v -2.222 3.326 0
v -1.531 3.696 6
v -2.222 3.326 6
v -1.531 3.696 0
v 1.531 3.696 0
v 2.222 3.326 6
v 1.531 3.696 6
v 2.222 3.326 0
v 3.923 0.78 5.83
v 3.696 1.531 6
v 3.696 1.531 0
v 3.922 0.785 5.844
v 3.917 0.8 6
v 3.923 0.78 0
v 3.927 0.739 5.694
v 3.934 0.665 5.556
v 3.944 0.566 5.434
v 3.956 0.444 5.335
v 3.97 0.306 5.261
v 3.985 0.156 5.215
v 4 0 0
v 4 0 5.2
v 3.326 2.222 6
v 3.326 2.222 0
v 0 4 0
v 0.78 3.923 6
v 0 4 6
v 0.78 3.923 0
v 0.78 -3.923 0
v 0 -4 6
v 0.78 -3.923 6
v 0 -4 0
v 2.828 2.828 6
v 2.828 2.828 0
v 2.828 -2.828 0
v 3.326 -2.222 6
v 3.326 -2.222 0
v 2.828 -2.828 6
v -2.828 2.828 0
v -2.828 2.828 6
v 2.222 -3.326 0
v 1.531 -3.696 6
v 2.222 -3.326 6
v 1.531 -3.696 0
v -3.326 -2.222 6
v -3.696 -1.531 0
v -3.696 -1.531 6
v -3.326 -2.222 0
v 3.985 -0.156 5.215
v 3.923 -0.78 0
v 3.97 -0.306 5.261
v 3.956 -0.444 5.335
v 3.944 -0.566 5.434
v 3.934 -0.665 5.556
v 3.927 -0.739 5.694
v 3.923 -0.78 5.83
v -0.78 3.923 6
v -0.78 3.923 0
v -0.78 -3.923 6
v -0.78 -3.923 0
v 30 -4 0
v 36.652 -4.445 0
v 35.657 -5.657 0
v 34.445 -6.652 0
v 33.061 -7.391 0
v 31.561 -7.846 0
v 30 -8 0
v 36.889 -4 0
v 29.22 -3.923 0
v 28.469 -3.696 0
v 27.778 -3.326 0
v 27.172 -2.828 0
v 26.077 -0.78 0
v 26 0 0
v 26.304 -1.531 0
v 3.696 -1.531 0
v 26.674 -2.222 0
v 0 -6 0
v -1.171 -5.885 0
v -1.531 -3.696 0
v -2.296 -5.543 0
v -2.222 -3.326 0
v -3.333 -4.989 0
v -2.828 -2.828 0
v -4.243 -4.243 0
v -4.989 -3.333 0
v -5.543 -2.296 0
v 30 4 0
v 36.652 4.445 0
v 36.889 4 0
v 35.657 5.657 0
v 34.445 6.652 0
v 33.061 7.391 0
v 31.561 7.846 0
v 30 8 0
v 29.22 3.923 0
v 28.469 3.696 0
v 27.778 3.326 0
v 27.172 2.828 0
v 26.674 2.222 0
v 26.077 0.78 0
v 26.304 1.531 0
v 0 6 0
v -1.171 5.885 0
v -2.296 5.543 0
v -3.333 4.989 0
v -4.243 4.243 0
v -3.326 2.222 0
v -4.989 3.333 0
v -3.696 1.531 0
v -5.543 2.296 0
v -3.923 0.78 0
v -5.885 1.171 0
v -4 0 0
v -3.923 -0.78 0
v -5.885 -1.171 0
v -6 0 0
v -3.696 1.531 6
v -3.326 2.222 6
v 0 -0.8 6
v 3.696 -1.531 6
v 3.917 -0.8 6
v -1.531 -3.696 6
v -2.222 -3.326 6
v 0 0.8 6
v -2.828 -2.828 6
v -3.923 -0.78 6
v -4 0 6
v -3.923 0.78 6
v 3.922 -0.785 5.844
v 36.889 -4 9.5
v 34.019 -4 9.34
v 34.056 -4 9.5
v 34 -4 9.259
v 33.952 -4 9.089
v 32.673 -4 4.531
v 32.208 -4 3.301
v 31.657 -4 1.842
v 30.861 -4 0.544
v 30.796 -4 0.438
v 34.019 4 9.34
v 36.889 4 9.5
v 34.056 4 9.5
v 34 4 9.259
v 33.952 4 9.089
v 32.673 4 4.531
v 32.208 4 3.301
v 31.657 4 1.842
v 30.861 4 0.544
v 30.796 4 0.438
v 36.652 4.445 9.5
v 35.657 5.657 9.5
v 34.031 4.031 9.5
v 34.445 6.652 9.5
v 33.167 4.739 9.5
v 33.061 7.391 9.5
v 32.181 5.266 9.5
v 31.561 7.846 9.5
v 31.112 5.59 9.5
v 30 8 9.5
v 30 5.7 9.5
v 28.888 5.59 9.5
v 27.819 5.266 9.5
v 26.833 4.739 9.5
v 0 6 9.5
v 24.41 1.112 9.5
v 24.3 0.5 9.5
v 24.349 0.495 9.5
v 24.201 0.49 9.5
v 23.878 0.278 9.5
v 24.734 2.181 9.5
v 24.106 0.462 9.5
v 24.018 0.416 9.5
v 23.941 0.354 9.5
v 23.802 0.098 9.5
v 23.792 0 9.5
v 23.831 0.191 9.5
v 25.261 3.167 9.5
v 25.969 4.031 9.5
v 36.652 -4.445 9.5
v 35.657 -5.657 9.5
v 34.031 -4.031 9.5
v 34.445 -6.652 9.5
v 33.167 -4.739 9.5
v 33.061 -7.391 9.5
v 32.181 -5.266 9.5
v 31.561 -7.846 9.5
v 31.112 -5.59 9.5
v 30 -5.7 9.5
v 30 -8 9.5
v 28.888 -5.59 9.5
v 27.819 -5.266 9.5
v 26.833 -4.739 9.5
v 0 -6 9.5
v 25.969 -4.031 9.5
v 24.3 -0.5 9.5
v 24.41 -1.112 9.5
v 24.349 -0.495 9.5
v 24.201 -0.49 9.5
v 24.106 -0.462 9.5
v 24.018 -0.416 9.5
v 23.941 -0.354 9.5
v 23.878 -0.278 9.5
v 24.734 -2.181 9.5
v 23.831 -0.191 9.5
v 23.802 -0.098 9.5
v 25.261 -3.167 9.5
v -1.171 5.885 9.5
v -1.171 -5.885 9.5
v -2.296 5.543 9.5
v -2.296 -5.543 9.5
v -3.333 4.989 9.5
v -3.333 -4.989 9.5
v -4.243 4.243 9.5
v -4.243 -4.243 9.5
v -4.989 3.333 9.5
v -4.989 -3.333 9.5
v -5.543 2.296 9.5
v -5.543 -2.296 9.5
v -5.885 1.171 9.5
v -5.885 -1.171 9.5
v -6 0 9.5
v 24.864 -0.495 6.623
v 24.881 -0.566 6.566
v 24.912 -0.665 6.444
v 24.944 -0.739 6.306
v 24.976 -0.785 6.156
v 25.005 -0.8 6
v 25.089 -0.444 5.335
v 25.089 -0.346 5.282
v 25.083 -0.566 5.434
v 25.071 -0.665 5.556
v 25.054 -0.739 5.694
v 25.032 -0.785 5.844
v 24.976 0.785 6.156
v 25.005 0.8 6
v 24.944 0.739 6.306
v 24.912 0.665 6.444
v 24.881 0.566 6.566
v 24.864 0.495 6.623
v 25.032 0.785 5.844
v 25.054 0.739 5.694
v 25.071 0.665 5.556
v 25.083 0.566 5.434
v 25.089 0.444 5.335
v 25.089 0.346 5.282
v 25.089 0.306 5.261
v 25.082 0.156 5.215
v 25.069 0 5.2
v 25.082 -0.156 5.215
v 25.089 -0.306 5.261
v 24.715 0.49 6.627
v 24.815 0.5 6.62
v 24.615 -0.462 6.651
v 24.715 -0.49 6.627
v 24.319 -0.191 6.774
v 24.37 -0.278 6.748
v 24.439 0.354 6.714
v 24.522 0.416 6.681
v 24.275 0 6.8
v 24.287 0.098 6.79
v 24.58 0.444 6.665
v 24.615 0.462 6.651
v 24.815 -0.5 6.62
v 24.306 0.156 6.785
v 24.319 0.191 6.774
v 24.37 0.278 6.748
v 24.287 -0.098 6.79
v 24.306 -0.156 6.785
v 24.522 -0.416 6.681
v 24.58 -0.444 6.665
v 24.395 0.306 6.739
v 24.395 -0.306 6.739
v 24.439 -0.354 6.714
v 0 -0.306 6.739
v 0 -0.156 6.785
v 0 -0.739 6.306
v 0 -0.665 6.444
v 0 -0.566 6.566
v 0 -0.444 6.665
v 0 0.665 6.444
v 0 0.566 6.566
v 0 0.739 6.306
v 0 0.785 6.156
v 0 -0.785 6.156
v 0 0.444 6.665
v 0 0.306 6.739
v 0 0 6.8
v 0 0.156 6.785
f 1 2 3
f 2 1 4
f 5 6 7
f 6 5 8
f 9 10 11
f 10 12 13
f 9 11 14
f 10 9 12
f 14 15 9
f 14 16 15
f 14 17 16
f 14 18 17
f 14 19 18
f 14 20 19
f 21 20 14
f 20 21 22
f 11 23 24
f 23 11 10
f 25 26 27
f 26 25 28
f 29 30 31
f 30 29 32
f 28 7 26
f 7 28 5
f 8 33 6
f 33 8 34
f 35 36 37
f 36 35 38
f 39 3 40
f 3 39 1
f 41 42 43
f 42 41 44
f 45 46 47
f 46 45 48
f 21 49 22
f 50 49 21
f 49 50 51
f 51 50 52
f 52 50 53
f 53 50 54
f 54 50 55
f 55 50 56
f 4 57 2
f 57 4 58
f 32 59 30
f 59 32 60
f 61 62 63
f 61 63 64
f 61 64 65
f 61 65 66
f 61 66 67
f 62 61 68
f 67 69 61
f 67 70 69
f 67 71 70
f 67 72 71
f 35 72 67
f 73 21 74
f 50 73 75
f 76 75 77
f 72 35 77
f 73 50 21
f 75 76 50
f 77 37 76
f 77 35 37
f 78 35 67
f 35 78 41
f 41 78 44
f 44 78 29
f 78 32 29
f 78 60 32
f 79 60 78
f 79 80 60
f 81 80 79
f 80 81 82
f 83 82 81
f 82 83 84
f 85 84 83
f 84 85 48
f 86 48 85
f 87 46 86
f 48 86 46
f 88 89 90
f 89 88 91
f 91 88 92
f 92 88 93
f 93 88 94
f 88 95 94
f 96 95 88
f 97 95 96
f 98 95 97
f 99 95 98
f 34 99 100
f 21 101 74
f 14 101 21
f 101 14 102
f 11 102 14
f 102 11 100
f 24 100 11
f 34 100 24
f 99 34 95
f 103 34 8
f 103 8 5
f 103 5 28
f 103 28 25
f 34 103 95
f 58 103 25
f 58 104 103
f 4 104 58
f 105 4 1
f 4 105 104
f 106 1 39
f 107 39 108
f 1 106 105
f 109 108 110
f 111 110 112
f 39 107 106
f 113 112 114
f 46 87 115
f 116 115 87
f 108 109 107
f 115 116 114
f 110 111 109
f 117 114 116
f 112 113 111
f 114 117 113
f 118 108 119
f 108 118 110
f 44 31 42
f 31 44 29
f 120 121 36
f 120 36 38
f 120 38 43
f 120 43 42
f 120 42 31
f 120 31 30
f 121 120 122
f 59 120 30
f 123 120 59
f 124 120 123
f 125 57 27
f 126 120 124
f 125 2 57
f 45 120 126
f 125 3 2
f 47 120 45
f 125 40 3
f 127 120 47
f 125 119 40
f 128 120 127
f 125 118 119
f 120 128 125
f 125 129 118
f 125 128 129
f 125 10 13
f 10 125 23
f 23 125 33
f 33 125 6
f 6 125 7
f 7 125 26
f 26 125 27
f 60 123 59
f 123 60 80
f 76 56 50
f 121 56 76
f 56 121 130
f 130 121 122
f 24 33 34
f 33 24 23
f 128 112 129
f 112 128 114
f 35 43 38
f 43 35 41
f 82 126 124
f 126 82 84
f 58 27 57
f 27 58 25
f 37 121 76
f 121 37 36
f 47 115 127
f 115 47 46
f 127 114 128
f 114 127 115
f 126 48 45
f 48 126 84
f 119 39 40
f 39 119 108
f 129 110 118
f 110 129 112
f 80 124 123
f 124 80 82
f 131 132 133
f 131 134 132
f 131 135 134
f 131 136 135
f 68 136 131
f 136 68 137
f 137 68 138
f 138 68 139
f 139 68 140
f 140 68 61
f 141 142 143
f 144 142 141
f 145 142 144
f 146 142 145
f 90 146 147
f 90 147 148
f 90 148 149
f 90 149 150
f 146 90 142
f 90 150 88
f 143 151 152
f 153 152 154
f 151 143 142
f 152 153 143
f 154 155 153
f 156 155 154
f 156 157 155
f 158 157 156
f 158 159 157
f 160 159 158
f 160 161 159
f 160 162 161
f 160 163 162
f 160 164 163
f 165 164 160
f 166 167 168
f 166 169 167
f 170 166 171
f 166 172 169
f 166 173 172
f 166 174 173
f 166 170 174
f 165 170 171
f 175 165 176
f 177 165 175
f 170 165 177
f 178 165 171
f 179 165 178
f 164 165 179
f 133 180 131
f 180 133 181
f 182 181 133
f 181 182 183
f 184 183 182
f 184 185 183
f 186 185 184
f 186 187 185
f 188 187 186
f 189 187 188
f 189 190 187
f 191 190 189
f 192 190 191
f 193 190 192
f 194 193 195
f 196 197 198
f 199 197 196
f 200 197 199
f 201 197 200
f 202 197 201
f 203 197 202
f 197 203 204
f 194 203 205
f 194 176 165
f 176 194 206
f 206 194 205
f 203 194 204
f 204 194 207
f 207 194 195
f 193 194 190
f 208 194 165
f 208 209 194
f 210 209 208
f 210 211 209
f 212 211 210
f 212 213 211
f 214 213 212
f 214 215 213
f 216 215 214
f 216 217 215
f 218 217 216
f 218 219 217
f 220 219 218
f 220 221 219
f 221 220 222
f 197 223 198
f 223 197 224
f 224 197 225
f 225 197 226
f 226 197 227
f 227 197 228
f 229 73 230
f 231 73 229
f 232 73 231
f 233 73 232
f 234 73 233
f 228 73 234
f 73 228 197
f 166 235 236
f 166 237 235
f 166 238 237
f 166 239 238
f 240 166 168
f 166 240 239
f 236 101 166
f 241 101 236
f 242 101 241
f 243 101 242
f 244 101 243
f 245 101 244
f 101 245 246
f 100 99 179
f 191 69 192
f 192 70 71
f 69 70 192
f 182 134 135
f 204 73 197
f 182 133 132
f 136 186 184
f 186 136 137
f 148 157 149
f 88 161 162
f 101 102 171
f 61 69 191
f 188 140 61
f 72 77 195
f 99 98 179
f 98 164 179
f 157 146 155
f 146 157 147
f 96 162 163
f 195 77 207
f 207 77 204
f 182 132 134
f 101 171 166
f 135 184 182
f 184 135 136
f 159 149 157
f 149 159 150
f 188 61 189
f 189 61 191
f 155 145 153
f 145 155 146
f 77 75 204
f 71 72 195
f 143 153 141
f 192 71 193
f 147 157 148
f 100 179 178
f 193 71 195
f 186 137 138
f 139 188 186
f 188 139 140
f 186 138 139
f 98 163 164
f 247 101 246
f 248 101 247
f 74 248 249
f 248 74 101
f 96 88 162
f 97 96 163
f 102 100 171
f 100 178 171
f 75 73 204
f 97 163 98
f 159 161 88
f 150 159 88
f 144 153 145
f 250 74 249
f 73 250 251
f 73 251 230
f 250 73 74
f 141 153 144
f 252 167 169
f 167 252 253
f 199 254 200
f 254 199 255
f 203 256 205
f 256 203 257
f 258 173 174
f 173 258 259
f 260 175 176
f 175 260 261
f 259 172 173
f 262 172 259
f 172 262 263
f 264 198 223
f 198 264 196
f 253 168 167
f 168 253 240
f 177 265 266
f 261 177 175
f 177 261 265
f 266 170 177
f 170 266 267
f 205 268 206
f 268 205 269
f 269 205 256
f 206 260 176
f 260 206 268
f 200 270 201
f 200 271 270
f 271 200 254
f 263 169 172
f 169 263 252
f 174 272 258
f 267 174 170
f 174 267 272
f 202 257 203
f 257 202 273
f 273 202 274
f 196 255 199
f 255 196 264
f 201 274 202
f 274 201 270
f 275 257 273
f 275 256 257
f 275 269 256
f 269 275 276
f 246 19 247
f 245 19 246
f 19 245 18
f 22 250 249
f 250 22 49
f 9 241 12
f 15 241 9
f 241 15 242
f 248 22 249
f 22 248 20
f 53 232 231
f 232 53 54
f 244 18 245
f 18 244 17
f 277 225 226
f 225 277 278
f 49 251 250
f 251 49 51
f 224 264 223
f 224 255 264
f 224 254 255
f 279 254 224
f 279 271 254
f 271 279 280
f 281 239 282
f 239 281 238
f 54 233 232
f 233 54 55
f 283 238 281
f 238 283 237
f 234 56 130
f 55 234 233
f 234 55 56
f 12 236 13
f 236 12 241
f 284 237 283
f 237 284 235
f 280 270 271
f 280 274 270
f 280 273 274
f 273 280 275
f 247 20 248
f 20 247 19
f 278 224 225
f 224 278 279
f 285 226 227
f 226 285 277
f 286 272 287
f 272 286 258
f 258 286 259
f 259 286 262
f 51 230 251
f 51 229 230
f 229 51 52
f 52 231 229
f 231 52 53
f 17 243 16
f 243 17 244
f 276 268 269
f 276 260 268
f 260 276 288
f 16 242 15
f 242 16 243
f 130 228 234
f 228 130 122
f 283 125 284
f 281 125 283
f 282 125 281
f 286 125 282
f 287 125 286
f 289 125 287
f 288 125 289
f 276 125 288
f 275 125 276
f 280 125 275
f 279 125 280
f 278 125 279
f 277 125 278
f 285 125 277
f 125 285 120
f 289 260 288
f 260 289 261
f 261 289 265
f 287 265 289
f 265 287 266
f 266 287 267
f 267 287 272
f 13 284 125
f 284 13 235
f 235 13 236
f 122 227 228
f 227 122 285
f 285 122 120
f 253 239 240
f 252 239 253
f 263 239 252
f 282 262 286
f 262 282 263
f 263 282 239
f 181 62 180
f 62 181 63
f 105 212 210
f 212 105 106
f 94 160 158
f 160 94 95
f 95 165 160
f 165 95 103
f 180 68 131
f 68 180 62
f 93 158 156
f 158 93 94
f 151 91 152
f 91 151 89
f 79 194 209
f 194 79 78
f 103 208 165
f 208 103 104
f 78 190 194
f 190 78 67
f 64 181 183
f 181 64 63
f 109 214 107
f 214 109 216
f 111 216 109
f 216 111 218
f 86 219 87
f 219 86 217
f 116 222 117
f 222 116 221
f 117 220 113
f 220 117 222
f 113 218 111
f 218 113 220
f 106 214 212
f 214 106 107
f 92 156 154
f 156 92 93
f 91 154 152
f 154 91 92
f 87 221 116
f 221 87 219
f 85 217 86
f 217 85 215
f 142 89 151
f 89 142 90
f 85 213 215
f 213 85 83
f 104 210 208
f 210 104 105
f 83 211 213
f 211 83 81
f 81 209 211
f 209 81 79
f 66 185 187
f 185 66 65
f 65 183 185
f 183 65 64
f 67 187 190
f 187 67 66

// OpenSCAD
$fn=32;

mounting_cone_hole = 0.5;
mounting_cone_hole_depth = 4;
mounting_cone_r_top = 2;
mounting_cone_r_bottom = 3;
mounting_cone_height = 8;

mounting_holes = [
[25.9, 25.1],
[35.8, 25.1],
[67.6, 25.1],
[25.1, 47.0],
[40.6, 45.2],
[26.9, 68.3]];

encoder_pos = [30.2, 35.9];
encoder_hole_r = 3.5;

disp_cutout = [25.5, 9];
disp_pos = [11 + 3 + encoder_pos[0], encoder_pos[1] - 0.8 - disp_cutout[1]/2];

stand_nuts = [[63, 35], [73, 45]];
stand_nuts_hole = 1.5;
stand_nuts_extra_strength = 1;
stand_nuts_socket_height = 2.5;
stand_nuts_socket_size = 3.1;
stand_nuts_socket_brim = 2;

front_plate_width = 2;
sides_width = 2;
sides_height = 35;
sides_offset = front_plate_width;

pcb_offset = [22.9, 22.6];
pcb_size = [70.9, 71.6] - pcb_offset;
// top, right, bottom, left
pcb_spacing = [4, 30, 1, 1];

connector_holes = [
[10, 23, 7.5/2],
[35, 23, 10/2]];

bottom_overlap = 2.5;
bottom_height = 1.5;
bottom_overlap_width = 3;

holder_mount_distance = stand_nuts[1] - stand_nuts[0];
holder_base_size = 20;
holder_base_height = 10;
holder_base_wire = 0.4;
holder_tower_r = 4;
holder_tower_height = 85;
holder_tower_hole = 1.5;
holder_screw_offset = 2;
holder_screw_head = 2.8;

holder_arm_height = 9.5;
holder_arm_length = 30;
holder_arm_tower_overlap_r = 2;
holder_arm_tower_overlap_h = 6;
holder_arm_circle = 8;
holder_arm_circle_inner_t = 5.7;
holder_arm_hole = 4;
holder_arm_wire = 0.8;
holder_arm_wire_hor = 0.5;


outer_a = [
        -pcb_spacing[3] - sides_width,
        -pcb_spacing[0] - sides_width];
    
outer_size = [
    pcb_size[0] + pcb_spacing[3] + pcb_spacing[1] + sides_width * 2,
    pcb_size[1] + pcb_spacing[2] + pcb_spacing[0] + sides_width * 2];


module base_plate()
{
    translate([-pcb_spacing[3], -pcb_spacing[0], 0])
    {
        cube([
            pcb_size[0] + pcb_spacing[3] + pcb_spacing[1],
            pcb_size[1] + pcb_spacing[2] + pcb_spacing[0],
            front_plate_width]);
    }
}

module mountings()
{
    translate([-pcb_offset[0], -pcb_offset[1], front_plate_width])
    {
        for (hole = mounting_holes)
        {
            translate([hole[0], hole[1], 0])
            {
                difference()
                {
                    cylinder(mounting_cone_height,
                             mounting_cone_r_bottom,
                             mounting_cone_r_top);
                    translate([
                        0,
                        0,
                        mounting_cone_height - mounting_cone_hole_depth])
                    {
                        cylinder(mounting_cone_hole_depth,
                                 mounting_cone_hole,
                                 mounting_cone_hole);
                    }
                }
            }
        }
    }
}

module display_cutout()
{
    translate([-pcb_offset[0] + disp_pos[0],
               -pcb_offset[1] + disp_pos[1],
               0])
    {
        cube([disp_cutout[0],
              disp_cutout[1],
              front_plate_width]);
    }
}

module encoder_hole()
{
    translate([-pcb_offset[0] + encoder_pos[0],
               -pcb_offset[1] + encoder_pos[1],
               0])
    {
        cylinder(h=front_plate_width,
                 r1=encoder_hole_r,
                 r2=encoder_hole_r);
    }
}

module sides()
{
    translate([outer_a[0], outer_a[1], sides_offset])
    {
        cube([outer_size[0], sides_width, sides_height]);
        cube([sides_width, outer_size[1], sides_height]);
    }
    
    translate([outer_a[0], outer_a[1] + outer_size[1] - sides_width, sides_offset])
    {
        cube([outer_size[0], sides_width, sides_height]);
    }
    
    translate([outer_a[0] + outer_size[0] - sides_width, outer_a[1], sides_offset])
    {
        cube([sides_width, outer_size[1], sides_height]);
    }
}

module connector_holes()
{
    translate([outer_a[0] + outer_size[0] - sides_width, 0, front_plate_width])
    {
        for (hole = connector_holes)
        {
            translate([0, hole[0], hole[1]])
            {
                rotate([0,90,0])
                {
                    cylinder(sides_width, hole[2], hole[2]);
                }
            }
        }
    }
}

module stand_nuts_pos()
{
    for (s = stand_nuts)
    {
        translate([s[0], s[1], front_plate_width])
        {
            cylinder(h = stand_nuts_socket_height, r = stand_nuts_socket_size + stand_nuts_socket_brim + stand_nuts_extra_strength, $fn=6);
        }
    }
}

module stand_nuts_neg()
{
    for (s = stand_nuts)
    {
        translate([s[0], s[1], 0])
        {
            cylinder(h = front_plate_width + stand_nuts_extra_strength, r = stand_nuts_hole);
        }
        translate([s[0], s[1], front_plate_width + stand_nuts_extra_strength])
        {
            cylinder(h = stand_nuts_socket_height, r = stand_nuts_socket_size, $fn=6);
        }
    }
}

module base()
{
    hull()
    {
        base_plate();
        translate([outer_a[0], outer_a[1], sides_offset - 0.01])
        {
            cube([outer_size[0], outer_size[1], 0.01]);
        }
    }
}

module front_plate()
{
    difference()
    {
        union()
        {
            base();
            stand_nuts_pos();
        }
        display_cutout();
        encoder_hole();
        stand_nuts_neg();
    }
    
    
    mountings();
    difference()
    {
        sides();
        connector_holes();
    }
}

module bottom_plate()
{
    
    translate([-pcb_spacing[3], -pcb_spacing[0], 0])
    {
        difference()
        {
            cube([
                pcb_size[0] + pcb_spacing[3] + pcb_spacing[1],
                pcb_size[1] + pcb_spacing[2] + pcb_spacing[0],
                bottom_overlap]);
            translate([bottom_overlap_width, bottom_overlap_width, 0])
            {
                cube([
                pcb_size[0] + pcb_spacing[3] + pcb_spacing[1] - bottom_overlap_width * 2,
                pcb_size[1] + pcb_spacing[2] + pcb_spacing[0] - bottom_overlap_width * 2,
                bottom_overlap]);
            }
        }
    }
    
    translate([outer_a[0], outer_a[1], -bottom_height])
    {
        cube([outer_size[0], outer_size[1], bottom_height]);
    }
}

module holder_tower()
{
    hull()
    {
        cube([holder_base_size, holder_base_size, 0.01]);
        translate([holder_base_size / 2, holder_base_size / 2, holder_base_height])
        {
            cylinder(h=0.01, r=holder_tower_r);
        }
    }
    translate([holder_base_size / 2, holder_base_size / 2, holder_base_height])
    {
        cylinder(h=holder_tower_height, r=holder_tower_r);
    }
}

module holder_tower_neg()
{
    translate([holder_base_size / 2, holder_base_size / 2, 0])
    {
        cylinder(h=(holder_base_height + holder_tower_height), r=holder_tower_hole);
        translate([-holder_mount_distance[0] / 2, -holder_mount_distance[1] / 2, 0])
        {
            cylinder(h=holder_screw_offset, r=stand_nuts_hole);
            translate([0, 0, holder_screw_offset])
            {
                cylinder(h=holder_base_height, r=holder_screw_head);
            }
        }
        translate([holder_mount_distance[0] / 2, holder_mount_distance[1] / 2, 0])
        {
            cylinder(h=holder_screw_offset, r=stand_nuts_hole);
            translate([0, 0, holder_screw_offset])
            {
                cylinder(h=holder_base_height, r=holder_screw_head);
            }
            
            k = stand_nuts_hole / sqrt(2);
            translate([-k, -k, 0])
            {
                cylinder(h=holder_screw_offset, r=holder_base_wire);
            }
        }
        rotate([0, 90, 45])
        {
            cylinder(h=norm(holder_mount_distance / 2), r=holder_base_wire);
        }
    }
}

module holder()
{
    difference()
    {
        holder_tower();
        holder_tower_neg();
    }
}

module holder_arm_pos()
{
    hull()
    {
        cylinder(h=holder_arm_height, r=(holder_arm_tower_overlap_r + holder_tower_r));
        translate([holder_arm_length, 0, 0])
        {
            cylinder(h=holder_arm_height, r=holder_arm_circle);
        }
    }
}

module holder_arm_neg()
{
    cylinder(h=holder_arm_tower_overlap_h, r=holder_tower_r);
    translate([holder_arm_length, 0, 0])
    {
        hull()
        {
            cylinder(h=holder_arm_height, r=holder_arm_hole);
            translate([holder_arm_length, 0, 0])
            {
                cylinder(h=holder_arm_height, r=holder_arm_hole);
            }
        }
    }
    translate([holder_arm_length, 0, 0])
    {
        cylinder(h=holder_arm_height, r1=holder_arm_hole, r2=holder_arm_circle_inner_t);
    }
    
    diff = holder_arm_circle_inner_t - holder_arm_hole;
    ang = -atan2(diff, holder_arm_height);
    rel_h = 1 - holder_arm_tower_overlap_h / holder_arm_height;
    
    
    translate([holder_arm_length - holder_arm_circle_inner_t + diff * rel_h, 0, holder_arm_tower_overlap_h])
    {
        rotate([0, ang, 0])
        {
            cylinder(h=holder_arm_height, r=holder_arm_wire_hor);
        }
        
    }
    
    translate([0, 0, holder_arm_tower_overlap_h])
    {
        rotate([0, 90, 0])
        {
            cylinder(h=holder_arm_length, r=holder_arm_wire);
        }
    }
}

module holder_arm()
{
    difference()
    {
        holder_arm_pos();
        holder_arm_neg();
    }
}

//front_plate();
/*
translate([58, 30, 0])
rotate([180, 0, 90])
{
    holder();
    translate([holder_base_size / 2, holder_base_size / 2, holder_tower_height + holder_base_height - holder_arm_tower_overlap_h])
    holder_arm();
}
*/
//translate([0, 0, 40])
//    bottom_plate();

//holder();
holder_arm();
